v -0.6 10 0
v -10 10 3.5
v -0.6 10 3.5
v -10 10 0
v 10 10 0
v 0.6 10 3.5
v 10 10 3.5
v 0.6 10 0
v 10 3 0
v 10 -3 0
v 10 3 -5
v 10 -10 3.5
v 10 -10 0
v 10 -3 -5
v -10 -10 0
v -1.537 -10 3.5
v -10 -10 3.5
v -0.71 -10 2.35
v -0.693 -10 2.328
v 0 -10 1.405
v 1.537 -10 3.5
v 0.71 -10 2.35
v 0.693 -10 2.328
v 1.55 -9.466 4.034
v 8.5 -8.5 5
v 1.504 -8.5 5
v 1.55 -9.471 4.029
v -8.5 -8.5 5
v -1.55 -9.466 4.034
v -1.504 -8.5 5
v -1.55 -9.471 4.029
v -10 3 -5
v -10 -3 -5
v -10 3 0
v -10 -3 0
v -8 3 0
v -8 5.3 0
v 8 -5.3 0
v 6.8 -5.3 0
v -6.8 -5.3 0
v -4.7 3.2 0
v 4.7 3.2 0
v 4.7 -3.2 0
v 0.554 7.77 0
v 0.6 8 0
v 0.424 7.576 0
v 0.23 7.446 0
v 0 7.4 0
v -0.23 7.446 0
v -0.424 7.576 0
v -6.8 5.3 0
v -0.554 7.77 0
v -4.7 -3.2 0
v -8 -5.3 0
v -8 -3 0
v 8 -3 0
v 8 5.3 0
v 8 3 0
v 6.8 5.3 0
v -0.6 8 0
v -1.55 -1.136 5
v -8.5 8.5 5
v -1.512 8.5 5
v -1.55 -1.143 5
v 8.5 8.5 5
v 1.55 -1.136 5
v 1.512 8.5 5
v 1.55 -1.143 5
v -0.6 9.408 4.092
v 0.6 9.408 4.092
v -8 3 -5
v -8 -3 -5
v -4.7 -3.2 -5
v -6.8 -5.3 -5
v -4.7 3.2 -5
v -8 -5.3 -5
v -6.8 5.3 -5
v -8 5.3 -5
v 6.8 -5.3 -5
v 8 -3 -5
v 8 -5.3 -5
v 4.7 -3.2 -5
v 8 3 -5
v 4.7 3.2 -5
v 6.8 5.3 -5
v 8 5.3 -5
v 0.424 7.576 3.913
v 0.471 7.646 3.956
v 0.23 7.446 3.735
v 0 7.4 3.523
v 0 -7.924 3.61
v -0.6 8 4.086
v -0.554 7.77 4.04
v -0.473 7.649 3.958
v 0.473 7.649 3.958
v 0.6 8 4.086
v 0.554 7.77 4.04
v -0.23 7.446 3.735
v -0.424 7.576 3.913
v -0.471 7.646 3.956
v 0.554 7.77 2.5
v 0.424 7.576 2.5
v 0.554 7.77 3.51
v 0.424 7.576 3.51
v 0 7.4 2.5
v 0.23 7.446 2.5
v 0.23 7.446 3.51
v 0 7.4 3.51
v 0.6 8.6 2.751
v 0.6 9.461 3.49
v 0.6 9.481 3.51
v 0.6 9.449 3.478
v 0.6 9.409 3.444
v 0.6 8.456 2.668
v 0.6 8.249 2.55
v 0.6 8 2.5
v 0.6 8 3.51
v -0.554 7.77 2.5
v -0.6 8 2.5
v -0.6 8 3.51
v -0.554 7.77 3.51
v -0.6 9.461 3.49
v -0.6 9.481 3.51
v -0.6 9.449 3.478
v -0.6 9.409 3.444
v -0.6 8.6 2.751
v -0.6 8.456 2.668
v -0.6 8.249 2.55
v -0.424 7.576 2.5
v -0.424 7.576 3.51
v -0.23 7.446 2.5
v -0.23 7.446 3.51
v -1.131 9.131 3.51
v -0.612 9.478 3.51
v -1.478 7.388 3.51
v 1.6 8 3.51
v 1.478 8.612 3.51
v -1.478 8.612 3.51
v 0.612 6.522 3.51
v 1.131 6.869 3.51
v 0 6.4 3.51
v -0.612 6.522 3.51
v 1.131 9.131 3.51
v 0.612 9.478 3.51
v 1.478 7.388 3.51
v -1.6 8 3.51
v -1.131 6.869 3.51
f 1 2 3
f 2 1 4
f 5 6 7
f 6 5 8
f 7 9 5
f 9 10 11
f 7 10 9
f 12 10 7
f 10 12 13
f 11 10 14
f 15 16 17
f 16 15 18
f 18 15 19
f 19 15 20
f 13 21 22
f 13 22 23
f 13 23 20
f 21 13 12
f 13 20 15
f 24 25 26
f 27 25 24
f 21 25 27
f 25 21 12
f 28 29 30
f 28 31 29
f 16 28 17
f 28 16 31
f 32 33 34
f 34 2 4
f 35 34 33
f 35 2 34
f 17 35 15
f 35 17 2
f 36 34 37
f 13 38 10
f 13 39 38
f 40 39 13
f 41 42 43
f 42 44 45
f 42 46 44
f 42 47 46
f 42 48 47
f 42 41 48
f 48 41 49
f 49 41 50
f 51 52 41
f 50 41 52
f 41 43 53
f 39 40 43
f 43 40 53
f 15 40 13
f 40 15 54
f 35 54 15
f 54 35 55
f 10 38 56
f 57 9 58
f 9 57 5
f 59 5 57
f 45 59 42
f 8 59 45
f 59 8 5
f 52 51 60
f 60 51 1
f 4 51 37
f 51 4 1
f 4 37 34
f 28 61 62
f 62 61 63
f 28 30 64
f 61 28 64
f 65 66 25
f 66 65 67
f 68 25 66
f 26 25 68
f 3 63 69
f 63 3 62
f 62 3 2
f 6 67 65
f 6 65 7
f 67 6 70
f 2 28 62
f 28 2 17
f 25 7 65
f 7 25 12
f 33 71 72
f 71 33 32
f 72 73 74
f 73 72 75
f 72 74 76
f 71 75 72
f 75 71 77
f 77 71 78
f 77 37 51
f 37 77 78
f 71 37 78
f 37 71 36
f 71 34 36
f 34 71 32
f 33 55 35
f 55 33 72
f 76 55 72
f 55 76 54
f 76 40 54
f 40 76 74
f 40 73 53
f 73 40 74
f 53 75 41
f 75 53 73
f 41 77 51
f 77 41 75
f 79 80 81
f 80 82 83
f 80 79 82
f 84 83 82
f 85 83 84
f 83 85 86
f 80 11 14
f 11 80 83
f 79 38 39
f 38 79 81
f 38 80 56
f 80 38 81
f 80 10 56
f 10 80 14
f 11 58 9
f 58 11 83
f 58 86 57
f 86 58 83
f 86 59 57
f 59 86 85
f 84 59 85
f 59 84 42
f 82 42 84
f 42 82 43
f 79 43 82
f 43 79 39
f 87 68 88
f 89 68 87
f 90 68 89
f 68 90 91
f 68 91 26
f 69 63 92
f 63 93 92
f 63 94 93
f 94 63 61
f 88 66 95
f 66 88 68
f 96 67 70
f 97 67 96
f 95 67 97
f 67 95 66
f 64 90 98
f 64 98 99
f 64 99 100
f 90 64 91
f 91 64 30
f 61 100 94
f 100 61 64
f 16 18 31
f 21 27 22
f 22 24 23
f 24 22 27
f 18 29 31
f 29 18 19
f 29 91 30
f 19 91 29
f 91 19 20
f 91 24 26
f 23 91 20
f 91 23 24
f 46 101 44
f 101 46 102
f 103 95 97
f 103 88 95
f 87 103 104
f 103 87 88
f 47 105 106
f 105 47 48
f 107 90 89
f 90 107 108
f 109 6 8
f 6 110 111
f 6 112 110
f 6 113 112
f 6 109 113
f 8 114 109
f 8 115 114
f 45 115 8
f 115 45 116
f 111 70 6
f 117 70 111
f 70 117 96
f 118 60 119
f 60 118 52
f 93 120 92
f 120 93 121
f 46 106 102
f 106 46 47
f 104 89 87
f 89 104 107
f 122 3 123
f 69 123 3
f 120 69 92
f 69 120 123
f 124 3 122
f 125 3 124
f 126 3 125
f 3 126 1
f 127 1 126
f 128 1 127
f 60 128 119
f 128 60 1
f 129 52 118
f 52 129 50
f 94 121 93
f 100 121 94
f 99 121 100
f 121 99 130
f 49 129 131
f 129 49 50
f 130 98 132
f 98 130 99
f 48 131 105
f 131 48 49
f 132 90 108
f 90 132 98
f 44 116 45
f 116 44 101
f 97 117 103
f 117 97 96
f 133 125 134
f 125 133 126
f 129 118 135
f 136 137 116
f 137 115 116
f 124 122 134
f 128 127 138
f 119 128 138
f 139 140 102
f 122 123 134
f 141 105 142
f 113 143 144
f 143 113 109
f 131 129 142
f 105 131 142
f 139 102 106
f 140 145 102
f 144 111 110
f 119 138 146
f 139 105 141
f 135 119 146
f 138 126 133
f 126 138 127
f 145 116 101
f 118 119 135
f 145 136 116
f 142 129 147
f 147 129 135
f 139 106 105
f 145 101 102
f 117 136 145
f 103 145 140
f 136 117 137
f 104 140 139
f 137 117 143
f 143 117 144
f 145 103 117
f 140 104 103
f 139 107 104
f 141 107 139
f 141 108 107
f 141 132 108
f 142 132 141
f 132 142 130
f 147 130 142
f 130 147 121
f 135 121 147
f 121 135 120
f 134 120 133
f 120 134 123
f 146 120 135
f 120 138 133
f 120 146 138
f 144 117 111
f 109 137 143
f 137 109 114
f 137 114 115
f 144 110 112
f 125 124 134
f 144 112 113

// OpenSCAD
// Spine cap, v3: a square 20 x 20 block that plugs into the top of the
// vertical 2020 and carries the balance line over it in a 45 degree V groove.
// The line comes up the spine's front slot from the carriage, crosses the top,
// and drops THROUGH the cap into the rear slot's channel, so it runs down
// inside the channel to the load stack's T slider (load-stack.scad). No
// guide line anchors any more: Matt tried guide lines on the rig, 2026-09-19,
// and gave them up for the rail's own channel.
//
// Press fit from the rail's own geometry: a tee tab into each SIDE slot,
// stem a touch wider than the slot opening, head a diamond under the lips
// with every face at 45 degrees or vertical. No centre peg. The front and
// rear slots are left open.
//
// Cut for plain T-slot 2020, not V-slot: a 6 mm straight opening, lips about
// 1.8 thick, an 11 mm channel. Measure the rail: slot_w is what the fit
// rides on, and generic extrusion runs 6.0 to 6.3.
//
// The top's front edge is chamfered 45 degrees and the V groove follows the
// chamfer down to the face, so the line bends twice by 45 on its way down to
// the carriage. At the rear the groove runs level to drop_y, where a thin slit
// goes down through the cap into the channel and out through the rear face,
// so the line is laid in with the cap on and sits at the slit's front end.
//
// Printed upside down (print_flip = true, which the STL is): the top face is
// on the bed, the V groove is a 45 degree cavity, the chamfer a 45 degree
// overhang, the tabs stand up. No support.
//
// Friction: a groove is a capstan and the line wraps 180 degrees. At 10 N
// hanging and mu ~0.15 on smooth PLA that is about 3.8 N to raise the arm
// and 6 N to lower it. Keep the groove smooth; a pulley is the fallback.
rail        = 20;
// Plain T-slot 2020. Measure yours.
slot_w      = 6.0;     // opening at the face
lip_t       = 1.8;     // face to the underside of the lip
chan_w      = 11;      // channel width just under the lips
chan_str    = 1.6;     // how far below the lips the channel stays full width, before it angles in at 45
chan_d      = 5.5;     // face to the deepest the tab may go
cap_h       = 5;       // above the rail's end
groove_w    = 3;       // at the surface; 45 degree walls, so 1.5 deep
edge_c      = 1.5;     // chamfer on the front top edge; the groove follows it, so at least groove_d
side_c      = 1.5;     // chamfer on the rear and side top edges, the same
tab_len     = 5;       // into the rail
tab_fit     = 0.0;     // a side, in the opening: 0.1 sheared on the first print, printed stems run fat anyway
tab_clr     = 0.2;     // a side, everywhere else
drop_y      = 8.0;     // the slit's front end: the line drops here into the channel, at load-stack.scad's line_y
drop_slit   = 1.2;     // a thin slit from there out through the rear face
print_flip  = false;   // top face down, tabs up
show_context = false;  // rail stub and the two line runs; preview only
$fn = 48;

half       = rail/2;
groove_d   = groove_w/2;
// Tab, distances from the rail centre: stem through the opening to just under
// the lip, then a head full width for the channel's straight part, then 45
// degrees in to the bottom: the shape of a 2020 channel. The first cut was a
// diamond widest 4 mm down, where the channel has already narrowed, and it
// sheared going in.
stem_h     = slot_w/2 + tab_fit;
stem_top   = half - lip_t - tab_clr;          // underside of the lip
head_h     = chan_w/2 - tab_clr;              // full width
head_y     = half - lip_t - chan_str + tab_clr;   // down to where the channel angles in
bottom_y   = half - chan_d + tab_clr;         // deepest point
bottom_h   = head_h - (head_y - bottom_y);    // half width there

assert(groove_d < cap_h - 1, "groove through the cap");
assert(edge_c >= groove_d, "chamfer shallower than the groove");
assert(bottom_h > 1.5, "tab bottom too narrow: raise chan_d or chan_str");
assert(head_y > bottom_y, "channel too shallow for the head");
echo(str("cap ", cap_h, " high; tab stem ", 2*stem_h, " wide, head ", 2*head_h,
         " wide from ", half - stem_top, " to ", half - head_y, " below the face, then 45 in to ",
         2*bottom_h, " wide at ", half - bottom_y));

module tab_2d() {   // for the +Y slot, y outward; rotated to the side slots
    polygon([
        [-stem_h, half], [-stem_h, stem_top], [-head_h, stem_top], [-head_h, head_y],
        [-bottom_h, bottom_y], [ bottom_h, bottom_y],
        [ head_h, head_y], [ head_h, stem_top], [ stem_h, stem_top], [ stem_h, half]
    ]);
}
module tabs() {
    for(a=[90, -90]) rotate([0,0,a]) translate([0,0,-tab_len]) linear_extrude(tab_len + 0.01) tab_2d();
}

// Body: YZ profile with the two chamfers, extruded across X.
module body_2d() {   // YZ: front chamfer edge_c, rear chamfer side_c
    polygon([[-half, 0], [half, 0], [half, cap_h - side_c], [half - side_c, cap_h],
             [-half + edge_c, cap_h], [-half, cap_h - edge_c]]);
}
module sides_2d() {  // XZ: side chamfers
    polygon([[-half, 0], [half, 0], [half, cap_h - side_c], [half - side_c, cap_h],
             [-half + side_c, cap_h], [-half, cap_h - side_c]]);
}
module yz(w) { rotate([90,0,90]) linear_extrude(w, center=true) children(); }

// V cutter cross-section: apex groove_d below the surface, flared above it.
module vee_2d() {
    polygon([[-groove_w/2 - 1, 1], [-groove_w/2, 0], [0, -groove_d], [groove_w/2, 0], [groove_w/2 + 1, 1]]);
}
// The V section at a point on the path, tilted about X by `tilt` so it stays
// square to the surface (0 on the top, -45 down the rear chamfer).
module vee_at(y, z, tilt) {
    translate([0, y, z]) rotate([tilt, 0, 0]) rotate([90,0,0]) linear_extrude(0.02, center=true) vee_2d();
}
module groove() {
    yt = half - edge_c;   // front chamfer starts
    e  = 1.5;             // run past the face
    hull() { vee_at(-yt, cap_h, 22.5); vee_at(half + e, cap_h, 0); }
    hull() { vee_at(-yt, cap_h, 22.5); vee_at(-half - e, cap_h - edge_c - e, 45); }
}

assert(drop_y + drop_slit/2 < half, "drop slit starts outside the rear face");
assert(groove_d >= side_c, "rear chamfer reaches down to the drop hole mouth");
module drop() {
    hull() for(y=[drop_y, half + 1]) translate([0, y, -1]) cylinder(h=cap_h + 2, d=drop_slit, $fn=16);
    // eased front end, where the line turns down out of the groove
    translate([0, drop_y, cap_h - groove_d - 1]) cylinder(h=1.01, d1=drop_slit, d2=drop_slit + 2, $fn=16);
}
module spine_cap() {
    difference() {
        union() {
            intersection() { yz(rail) body_2d(); rotate([90,0,0]) linear_extrude(rail + 2, center=true) sides_2d(); }
            tabs();
        }
        groove();
        drop();
    }
}

if(print_flip) translate([0,0,cap_h]) rotate([180,0,0]) spine_cap();
else spine_cap();

if(show_context && !print_flip) %union() {
    translate([0,0,-60]) color([0.66,0.71,0.75]) linear_extrude(60) difference() {
        square(rail, center=true);
        for(a=[0:90:270]) rotate(a) {
            translate([-slot_w/2, half - lip_t]) square([slot_w, lip_t + 1]);
            translate([-chan_w/2, half - chan_d]) square([chan_w, chan_d - lip_t]);
        }
    }
    color([0.1,0.7,0.9]) for(y=[-half, half])
        translate([0, y, -60]) cylinder(h=60 + cap_h - edge_c, d=0.6, $fn=8);
}
